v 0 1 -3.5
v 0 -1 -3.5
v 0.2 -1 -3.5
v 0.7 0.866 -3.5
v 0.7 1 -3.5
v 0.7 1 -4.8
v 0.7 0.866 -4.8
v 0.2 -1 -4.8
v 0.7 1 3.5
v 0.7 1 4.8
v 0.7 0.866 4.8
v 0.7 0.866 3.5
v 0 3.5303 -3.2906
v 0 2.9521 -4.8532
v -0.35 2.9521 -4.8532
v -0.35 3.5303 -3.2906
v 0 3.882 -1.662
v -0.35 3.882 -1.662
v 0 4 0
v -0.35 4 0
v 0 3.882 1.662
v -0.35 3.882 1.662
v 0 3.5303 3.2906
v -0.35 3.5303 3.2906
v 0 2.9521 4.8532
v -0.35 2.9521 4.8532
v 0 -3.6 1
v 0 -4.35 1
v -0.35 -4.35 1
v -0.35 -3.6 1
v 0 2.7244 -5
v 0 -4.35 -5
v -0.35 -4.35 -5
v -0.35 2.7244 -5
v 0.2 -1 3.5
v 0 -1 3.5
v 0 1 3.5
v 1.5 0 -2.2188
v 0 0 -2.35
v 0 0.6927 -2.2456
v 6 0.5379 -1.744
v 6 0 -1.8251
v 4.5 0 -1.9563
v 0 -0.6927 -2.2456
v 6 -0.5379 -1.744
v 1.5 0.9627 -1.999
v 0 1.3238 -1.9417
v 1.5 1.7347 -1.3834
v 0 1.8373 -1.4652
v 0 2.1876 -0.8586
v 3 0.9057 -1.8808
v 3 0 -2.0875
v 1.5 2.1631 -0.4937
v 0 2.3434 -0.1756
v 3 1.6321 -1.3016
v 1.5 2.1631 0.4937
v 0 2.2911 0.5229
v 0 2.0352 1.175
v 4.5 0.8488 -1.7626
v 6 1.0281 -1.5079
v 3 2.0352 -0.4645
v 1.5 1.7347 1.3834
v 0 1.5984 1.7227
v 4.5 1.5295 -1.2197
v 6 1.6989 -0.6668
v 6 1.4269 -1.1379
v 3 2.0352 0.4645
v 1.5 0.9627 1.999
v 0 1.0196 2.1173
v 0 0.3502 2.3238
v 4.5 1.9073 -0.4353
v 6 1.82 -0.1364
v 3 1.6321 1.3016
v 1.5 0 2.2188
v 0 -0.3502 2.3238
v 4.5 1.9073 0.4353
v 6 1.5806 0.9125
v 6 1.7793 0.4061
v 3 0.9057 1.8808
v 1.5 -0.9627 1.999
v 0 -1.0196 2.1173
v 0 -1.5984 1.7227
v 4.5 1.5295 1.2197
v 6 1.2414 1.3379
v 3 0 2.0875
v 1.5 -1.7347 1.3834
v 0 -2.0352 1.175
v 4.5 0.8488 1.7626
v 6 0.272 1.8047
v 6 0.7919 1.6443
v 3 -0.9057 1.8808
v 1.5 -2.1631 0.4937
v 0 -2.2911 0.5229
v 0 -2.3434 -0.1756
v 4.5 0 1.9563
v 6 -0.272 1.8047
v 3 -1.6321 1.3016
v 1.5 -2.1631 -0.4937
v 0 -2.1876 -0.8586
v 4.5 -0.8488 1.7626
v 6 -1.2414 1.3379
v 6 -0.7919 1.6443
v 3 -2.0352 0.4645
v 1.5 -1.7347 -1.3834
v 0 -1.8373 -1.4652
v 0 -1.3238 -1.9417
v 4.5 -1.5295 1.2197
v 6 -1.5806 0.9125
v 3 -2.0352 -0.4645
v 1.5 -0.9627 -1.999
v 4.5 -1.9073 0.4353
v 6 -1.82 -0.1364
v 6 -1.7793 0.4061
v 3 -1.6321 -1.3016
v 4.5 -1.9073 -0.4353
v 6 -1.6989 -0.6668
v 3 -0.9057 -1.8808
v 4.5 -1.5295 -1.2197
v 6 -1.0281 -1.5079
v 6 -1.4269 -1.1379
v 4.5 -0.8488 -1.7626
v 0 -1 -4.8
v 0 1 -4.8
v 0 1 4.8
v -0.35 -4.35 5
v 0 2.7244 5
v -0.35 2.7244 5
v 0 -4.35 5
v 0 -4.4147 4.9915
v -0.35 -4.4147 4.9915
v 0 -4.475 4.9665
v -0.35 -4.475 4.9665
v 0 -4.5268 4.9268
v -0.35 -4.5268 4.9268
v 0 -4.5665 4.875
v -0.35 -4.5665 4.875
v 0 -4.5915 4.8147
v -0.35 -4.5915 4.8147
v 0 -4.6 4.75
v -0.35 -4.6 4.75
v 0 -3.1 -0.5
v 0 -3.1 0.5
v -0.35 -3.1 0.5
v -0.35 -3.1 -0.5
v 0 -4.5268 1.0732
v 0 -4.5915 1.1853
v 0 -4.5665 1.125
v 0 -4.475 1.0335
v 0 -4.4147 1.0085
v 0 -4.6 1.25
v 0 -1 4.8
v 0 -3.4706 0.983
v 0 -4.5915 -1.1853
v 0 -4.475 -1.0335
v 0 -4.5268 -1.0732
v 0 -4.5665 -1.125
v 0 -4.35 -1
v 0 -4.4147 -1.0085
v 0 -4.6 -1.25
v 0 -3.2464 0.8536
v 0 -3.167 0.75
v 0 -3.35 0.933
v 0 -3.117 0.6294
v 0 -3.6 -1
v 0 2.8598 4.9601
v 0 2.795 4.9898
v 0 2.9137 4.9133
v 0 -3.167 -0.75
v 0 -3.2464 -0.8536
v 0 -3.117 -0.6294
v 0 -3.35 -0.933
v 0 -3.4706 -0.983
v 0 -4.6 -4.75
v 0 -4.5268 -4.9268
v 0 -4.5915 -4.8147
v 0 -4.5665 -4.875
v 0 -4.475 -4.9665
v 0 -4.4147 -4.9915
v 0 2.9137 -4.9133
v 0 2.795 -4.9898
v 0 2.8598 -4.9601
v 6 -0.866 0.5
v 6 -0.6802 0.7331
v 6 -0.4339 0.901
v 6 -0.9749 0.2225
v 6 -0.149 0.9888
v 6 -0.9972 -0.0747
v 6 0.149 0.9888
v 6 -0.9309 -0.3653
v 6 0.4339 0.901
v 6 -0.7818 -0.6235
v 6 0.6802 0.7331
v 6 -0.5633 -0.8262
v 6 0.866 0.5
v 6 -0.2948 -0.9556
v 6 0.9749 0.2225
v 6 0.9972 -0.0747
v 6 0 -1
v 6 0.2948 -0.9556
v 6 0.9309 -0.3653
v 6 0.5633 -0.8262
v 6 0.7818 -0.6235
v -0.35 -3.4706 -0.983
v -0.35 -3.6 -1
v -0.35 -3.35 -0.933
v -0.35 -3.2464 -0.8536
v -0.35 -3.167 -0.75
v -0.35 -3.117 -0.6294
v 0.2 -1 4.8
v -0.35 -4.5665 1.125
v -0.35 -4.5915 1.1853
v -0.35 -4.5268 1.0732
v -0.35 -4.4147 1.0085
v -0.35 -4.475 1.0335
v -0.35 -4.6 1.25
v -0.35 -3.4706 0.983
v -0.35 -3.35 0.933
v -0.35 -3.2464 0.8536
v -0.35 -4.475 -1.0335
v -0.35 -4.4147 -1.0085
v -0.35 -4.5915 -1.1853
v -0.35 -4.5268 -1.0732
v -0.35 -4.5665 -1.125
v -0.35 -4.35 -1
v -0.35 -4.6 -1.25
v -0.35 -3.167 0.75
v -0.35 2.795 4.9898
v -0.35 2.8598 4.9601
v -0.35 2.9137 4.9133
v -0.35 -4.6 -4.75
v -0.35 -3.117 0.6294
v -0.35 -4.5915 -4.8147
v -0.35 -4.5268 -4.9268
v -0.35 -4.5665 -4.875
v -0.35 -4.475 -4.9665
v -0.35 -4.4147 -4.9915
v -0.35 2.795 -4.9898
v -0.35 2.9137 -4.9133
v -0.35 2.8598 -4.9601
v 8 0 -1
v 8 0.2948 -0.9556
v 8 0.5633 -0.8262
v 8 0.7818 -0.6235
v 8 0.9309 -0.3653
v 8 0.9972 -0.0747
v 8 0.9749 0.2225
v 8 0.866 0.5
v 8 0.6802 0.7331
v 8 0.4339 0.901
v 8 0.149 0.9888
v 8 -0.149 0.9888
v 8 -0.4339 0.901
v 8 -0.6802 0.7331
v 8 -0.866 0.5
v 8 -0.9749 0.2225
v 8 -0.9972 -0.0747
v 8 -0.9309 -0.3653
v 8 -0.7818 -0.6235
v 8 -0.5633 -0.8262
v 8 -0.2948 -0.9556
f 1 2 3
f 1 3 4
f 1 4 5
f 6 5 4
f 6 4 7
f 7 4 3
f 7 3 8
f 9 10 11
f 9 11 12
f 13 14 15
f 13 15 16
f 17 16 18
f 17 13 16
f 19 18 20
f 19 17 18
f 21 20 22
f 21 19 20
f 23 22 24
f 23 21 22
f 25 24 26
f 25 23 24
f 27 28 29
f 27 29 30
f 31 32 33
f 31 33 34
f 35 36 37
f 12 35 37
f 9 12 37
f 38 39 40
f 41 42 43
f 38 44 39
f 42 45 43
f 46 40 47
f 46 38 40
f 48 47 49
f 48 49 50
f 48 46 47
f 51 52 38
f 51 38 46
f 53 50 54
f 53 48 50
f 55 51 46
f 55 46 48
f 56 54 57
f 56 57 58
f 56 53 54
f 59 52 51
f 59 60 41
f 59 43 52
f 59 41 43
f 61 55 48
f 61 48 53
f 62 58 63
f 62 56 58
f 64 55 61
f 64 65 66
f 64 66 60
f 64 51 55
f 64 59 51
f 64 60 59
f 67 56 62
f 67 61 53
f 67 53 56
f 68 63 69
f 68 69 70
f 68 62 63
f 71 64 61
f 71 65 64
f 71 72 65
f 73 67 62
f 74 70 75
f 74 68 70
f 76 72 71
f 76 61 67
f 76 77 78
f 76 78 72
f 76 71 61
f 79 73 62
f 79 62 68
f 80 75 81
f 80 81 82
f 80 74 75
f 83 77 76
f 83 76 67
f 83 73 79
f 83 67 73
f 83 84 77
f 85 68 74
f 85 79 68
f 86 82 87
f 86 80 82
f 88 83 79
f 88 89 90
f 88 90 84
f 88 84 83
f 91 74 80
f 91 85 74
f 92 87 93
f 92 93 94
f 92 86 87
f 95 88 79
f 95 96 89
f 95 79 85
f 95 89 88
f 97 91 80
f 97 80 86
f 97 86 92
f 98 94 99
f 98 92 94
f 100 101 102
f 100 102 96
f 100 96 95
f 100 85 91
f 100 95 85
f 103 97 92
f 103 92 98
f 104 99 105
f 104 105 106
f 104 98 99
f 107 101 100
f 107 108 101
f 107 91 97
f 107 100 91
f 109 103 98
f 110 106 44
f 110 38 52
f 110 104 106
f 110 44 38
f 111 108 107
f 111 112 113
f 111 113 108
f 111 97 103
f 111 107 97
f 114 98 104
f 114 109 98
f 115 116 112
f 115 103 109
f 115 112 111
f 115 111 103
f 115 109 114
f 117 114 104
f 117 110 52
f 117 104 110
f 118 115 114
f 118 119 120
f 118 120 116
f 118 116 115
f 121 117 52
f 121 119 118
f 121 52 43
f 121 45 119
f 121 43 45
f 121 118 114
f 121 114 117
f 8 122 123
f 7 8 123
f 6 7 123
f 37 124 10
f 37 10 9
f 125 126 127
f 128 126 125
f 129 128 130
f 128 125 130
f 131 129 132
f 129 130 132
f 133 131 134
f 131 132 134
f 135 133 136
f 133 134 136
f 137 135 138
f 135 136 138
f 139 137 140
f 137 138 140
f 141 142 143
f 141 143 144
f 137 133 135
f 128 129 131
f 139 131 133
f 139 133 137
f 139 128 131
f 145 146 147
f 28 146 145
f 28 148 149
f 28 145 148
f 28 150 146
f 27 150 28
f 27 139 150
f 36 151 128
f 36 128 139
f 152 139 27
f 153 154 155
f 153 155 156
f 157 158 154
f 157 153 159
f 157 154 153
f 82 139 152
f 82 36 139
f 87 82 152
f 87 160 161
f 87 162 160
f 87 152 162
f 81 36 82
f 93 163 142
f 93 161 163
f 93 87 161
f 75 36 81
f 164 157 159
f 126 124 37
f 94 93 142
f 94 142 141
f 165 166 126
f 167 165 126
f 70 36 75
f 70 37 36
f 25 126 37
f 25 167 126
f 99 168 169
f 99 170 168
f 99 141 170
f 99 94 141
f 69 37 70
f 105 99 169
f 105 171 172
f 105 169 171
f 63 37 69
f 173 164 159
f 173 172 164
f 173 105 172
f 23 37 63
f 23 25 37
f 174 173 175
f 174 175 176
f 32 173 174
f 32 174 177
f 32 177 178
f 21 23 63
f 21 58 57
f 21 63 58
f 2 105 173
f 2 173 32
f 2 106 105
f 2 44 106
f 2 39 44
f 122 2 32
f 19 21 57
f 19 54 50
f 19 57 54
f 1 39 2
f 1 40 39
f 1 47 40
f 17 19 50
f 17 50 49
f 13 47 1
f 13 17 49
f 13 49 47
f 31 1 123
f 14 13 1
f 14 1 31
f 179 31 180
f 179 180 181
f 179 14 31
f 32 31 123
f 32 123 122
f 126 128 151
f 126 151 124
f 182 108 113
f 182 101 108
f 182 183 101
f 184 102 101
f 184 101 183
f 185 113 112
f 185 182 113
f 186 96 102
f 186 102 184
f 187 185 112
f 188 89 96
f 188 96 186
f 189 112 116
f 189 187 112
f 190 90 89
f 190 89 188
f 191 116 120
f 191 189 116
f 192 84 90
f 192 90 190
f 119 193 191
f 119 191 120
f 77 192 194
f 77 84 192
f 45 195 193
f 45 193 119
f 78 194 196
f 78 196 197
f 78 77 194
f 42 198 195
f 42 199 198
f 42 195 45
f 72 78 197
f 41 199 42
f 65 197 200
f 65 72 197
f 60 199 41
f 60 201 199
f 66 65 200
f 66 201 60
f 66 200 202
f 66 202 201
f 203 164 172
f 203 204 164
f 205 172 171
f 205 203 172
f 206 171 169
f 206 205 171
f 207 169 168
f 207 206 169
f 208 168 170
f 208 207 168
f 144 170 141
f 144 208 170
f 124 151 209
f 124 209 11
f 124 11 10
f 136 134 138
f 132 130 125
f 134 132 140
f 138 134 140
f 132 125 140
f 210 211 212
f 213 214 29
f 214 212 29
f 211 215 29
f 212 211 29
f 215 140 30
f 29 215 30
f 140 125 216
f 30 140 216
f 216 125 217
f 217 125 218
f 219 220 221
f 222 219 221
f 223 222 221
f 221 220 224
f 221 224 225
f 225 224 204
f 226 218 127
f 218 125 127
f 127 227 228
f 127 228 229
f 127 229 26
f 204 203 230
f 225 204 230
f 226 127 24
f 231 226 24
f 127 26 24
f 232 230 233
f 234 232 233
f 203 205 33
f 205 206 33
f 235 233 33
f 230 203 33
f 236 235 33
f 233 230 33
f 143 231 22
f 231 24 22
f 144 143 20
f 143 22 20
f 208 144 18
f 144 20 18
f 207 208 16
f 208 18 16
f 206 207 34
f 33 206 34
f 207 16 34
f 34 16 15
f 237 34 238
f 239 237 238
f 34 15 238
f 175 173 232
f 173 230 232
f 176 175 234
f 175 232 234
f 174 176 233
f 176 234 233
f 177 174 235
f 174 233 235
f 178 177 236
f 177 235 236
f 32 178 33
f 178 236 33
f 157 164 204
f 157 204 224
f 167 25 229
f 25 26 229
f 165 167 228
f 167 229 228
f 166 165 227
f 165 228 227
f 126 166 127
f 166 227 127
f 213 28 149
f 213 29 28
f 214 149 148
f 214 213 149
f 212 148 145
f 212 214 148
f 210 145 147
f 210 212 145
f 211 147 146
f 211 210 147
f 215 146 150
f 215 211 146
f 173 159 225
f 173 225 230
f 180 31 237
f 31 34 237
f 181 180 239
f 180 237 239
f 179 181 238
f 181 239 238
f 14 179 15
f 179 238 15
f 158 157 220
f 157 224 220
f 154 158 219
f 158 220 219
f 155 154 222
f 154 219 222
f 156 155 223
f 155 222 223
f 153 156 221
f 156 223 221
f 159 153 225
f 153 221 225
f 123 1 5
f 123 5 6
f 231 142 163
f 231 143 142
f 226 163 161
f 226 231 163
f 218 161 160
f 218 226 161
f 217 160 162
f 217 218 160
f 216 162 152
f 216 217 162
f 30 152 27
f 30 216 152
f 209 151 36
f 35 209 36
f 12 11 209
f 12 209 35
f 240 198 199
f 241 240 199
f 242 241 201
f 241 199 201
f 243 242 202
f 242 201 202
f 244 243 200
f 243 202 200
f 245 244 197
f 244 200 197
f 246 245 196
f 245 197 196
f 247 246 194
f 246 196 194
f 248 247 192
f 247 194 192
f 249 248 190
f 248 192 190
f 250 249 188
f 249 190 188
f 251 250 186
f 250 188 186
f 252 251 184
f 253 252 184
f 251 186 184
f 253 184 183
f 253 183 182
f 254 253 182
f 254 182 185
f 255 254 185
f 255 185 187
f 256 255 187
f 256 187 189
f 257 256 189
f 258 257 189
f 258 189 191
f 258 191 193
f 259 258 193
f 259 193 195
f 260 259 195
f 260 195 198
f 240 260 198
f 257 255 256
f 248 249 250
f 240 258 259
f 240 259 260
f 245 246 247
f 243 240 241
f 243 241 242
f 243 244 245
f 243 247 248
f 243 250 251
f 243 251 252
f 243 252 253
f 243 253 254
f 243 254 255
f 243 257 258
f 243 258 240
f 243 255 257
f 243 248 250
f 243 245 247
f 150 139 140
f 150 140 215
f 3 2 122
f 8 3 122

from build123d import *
from OCP.BRepFilletAPI import BRepFilletAPI_MakeChamfer

# Parameters (mm, degrees)
SKETCH1_R           = 2.35
BOSS_EXTRUDE1_DEPTH = 6
BOSS_EXTRUDE1_TAPER = 5
BOSS_EXTRUDE2_DEPTH = 0.35
SKETCH3_W           = 1.3
SKETCH3_H           = 2
BOSS_EXTRUDE3_DEPTH = 0.7
CHAMFER1_SIZE       = 0.5
CHAMFER1_SIZE2      = 1.866025404
FILLET2_R           = 0.5
FILLET3_R           = 0.25
SKETCH4_R           = 1
BOSS_EXTRUDE4_DEPTH = 8


with BuildPart() as part:
    # Sketch1 → Boss-Extrude1 (new body)
    with BuildSketch(Plane(origin=(0, 0, 0), x_dir=(0, 0, -1), z_dir=(1, 0, 0))):
        Circle(SKETCH1_R)
    extrude(amount=BOSS_EXTRUDE1_DEPTH, taper=BOSS_EXTRUDE1_TAPER)

    # Sketch2 → Boss-Extrude2 (add)
    with BuildSketch(Plane(origin=(0, 0, 0), x_dir=(0, 0, -1), z_dir=(1, 0, 0))):
        with BuildLine():
            Line((1, -4.6), (5, -4.6))
            Line((5, -4.6), (5, 2.495381949))
            Line((5, 2.495381949), (5, 2.884339454))
            ThreePointArc((5, 2.884339454), (0, 4), (-5, 2.884339454))
            Line((-5, 2.884339454), (-5, 2.495381949))
            Line((-5, 2.495381949), (-5, -4.6))
            Line((-5, -4.6), (-1, -4.6))
            Line((-1, -4.6), (-1, -3.1))
            Line((-1, -3.1), (1, -3.1))
            Line((1, -3.1), (1, -4.6))
        make_face()
    extrude(amount=-BOSS_EXTRUDE2_DEPTH)

    # Sketch3 → Boss-Extrude3 (add)
    with BuildSketch(Plane(origin=(0, 0, 0), x_dir=(0, 0, -1), z_dir=(1, 0, 0))):
        with Locations((-4.15, 0)):
            Rectangle(SKETCH3_W, SKETCH3_H)
        with Locations((4.15, 0)):
            Rectangle(SKETCH3_W, SKETCH3_H)
    extrude(amount=BOSS_EXTRUDE3_DEPTH)

    # Chamfer1: one chamfer whose edges measure the first distance from different faces: ONE call of the kernel's chamfer builder (chamfer() names one face for all edges)
    chamfer1_edges_1 = [part.edges().sort_by_distance(p)[0] for p in [
        (0.7, -1, 4.15),
    ]]
    chamfer1_side_1 = [part.faces().sort_by_distance(p)[0] for p in [
        (0.35, -1, 4.15),
    ]]
    chamfer1_edges_2 = [part.edges().sort_by_distance(p)[0] for p in [
        (0.7, -1, -4.15),
    ]]
    chamfer1_side_2 = [part.faces().sort_by_distance(p)[0] for p in [
        (0.35, -1, -4.15),
    ]]
    chamfer1 = BRepFilletAPI_MakeChamfer(part.part.solid().wrapped)
    for e in chamfer1_edges_1:
        chamfer1.Add(CHAMFER1_SIZE, CHAMFER1_SIZE2, e.wrapped, chamfer1_side_1[0].wrapped)  # the first distance lies on this face
    for e in chamfer1_edges_2:
        chamfer1.Add(CHAMFER1_SIZE, CHAMFER1_SIZE2, e.wrapped, chamfer1_side_2[0].wrapped)  # the first distance lies on this face
    add(Compound.cast(chamfer1.Shape()), mode=Mode.REPLACE)

    # Fillet2
    fillet2_edges = [part.edges().sort_by_distance(p)[0] for p in [
        (-0.175, -3.1, -1),
        (-0.175, -3.1, 1),
    ]]
    fillet(fillet2_edges, radius=FILLET2_R)

    # Fillet3
    fillet3_edges = [part.edges().sort_by_distance(p)[0] for p in [
        (-0.175, -4.6, 1),
        (-0.175, -4.6, 5),
        (-0.175, 2.884339454, 5),
        (-0.175, 2.884339454, -5),
        (-0.175, -4.6, -5),
        (-0.175, -4.6, -1),
    ]]
    fillet(fillet3_edges, radius=FILLET3_R)

    # Sketch4 → Boss-Extrude4 (add)
    with BuildSketch(Plane(origin=(0, 0, 0), x_dir=(0, 0, -1), z_dir=(1, 0, 0))):
        Circle(SKETCH4_R)
    extrude(amount=BOSS_EXTRUDE4_DEPTH)


solid = part.part
